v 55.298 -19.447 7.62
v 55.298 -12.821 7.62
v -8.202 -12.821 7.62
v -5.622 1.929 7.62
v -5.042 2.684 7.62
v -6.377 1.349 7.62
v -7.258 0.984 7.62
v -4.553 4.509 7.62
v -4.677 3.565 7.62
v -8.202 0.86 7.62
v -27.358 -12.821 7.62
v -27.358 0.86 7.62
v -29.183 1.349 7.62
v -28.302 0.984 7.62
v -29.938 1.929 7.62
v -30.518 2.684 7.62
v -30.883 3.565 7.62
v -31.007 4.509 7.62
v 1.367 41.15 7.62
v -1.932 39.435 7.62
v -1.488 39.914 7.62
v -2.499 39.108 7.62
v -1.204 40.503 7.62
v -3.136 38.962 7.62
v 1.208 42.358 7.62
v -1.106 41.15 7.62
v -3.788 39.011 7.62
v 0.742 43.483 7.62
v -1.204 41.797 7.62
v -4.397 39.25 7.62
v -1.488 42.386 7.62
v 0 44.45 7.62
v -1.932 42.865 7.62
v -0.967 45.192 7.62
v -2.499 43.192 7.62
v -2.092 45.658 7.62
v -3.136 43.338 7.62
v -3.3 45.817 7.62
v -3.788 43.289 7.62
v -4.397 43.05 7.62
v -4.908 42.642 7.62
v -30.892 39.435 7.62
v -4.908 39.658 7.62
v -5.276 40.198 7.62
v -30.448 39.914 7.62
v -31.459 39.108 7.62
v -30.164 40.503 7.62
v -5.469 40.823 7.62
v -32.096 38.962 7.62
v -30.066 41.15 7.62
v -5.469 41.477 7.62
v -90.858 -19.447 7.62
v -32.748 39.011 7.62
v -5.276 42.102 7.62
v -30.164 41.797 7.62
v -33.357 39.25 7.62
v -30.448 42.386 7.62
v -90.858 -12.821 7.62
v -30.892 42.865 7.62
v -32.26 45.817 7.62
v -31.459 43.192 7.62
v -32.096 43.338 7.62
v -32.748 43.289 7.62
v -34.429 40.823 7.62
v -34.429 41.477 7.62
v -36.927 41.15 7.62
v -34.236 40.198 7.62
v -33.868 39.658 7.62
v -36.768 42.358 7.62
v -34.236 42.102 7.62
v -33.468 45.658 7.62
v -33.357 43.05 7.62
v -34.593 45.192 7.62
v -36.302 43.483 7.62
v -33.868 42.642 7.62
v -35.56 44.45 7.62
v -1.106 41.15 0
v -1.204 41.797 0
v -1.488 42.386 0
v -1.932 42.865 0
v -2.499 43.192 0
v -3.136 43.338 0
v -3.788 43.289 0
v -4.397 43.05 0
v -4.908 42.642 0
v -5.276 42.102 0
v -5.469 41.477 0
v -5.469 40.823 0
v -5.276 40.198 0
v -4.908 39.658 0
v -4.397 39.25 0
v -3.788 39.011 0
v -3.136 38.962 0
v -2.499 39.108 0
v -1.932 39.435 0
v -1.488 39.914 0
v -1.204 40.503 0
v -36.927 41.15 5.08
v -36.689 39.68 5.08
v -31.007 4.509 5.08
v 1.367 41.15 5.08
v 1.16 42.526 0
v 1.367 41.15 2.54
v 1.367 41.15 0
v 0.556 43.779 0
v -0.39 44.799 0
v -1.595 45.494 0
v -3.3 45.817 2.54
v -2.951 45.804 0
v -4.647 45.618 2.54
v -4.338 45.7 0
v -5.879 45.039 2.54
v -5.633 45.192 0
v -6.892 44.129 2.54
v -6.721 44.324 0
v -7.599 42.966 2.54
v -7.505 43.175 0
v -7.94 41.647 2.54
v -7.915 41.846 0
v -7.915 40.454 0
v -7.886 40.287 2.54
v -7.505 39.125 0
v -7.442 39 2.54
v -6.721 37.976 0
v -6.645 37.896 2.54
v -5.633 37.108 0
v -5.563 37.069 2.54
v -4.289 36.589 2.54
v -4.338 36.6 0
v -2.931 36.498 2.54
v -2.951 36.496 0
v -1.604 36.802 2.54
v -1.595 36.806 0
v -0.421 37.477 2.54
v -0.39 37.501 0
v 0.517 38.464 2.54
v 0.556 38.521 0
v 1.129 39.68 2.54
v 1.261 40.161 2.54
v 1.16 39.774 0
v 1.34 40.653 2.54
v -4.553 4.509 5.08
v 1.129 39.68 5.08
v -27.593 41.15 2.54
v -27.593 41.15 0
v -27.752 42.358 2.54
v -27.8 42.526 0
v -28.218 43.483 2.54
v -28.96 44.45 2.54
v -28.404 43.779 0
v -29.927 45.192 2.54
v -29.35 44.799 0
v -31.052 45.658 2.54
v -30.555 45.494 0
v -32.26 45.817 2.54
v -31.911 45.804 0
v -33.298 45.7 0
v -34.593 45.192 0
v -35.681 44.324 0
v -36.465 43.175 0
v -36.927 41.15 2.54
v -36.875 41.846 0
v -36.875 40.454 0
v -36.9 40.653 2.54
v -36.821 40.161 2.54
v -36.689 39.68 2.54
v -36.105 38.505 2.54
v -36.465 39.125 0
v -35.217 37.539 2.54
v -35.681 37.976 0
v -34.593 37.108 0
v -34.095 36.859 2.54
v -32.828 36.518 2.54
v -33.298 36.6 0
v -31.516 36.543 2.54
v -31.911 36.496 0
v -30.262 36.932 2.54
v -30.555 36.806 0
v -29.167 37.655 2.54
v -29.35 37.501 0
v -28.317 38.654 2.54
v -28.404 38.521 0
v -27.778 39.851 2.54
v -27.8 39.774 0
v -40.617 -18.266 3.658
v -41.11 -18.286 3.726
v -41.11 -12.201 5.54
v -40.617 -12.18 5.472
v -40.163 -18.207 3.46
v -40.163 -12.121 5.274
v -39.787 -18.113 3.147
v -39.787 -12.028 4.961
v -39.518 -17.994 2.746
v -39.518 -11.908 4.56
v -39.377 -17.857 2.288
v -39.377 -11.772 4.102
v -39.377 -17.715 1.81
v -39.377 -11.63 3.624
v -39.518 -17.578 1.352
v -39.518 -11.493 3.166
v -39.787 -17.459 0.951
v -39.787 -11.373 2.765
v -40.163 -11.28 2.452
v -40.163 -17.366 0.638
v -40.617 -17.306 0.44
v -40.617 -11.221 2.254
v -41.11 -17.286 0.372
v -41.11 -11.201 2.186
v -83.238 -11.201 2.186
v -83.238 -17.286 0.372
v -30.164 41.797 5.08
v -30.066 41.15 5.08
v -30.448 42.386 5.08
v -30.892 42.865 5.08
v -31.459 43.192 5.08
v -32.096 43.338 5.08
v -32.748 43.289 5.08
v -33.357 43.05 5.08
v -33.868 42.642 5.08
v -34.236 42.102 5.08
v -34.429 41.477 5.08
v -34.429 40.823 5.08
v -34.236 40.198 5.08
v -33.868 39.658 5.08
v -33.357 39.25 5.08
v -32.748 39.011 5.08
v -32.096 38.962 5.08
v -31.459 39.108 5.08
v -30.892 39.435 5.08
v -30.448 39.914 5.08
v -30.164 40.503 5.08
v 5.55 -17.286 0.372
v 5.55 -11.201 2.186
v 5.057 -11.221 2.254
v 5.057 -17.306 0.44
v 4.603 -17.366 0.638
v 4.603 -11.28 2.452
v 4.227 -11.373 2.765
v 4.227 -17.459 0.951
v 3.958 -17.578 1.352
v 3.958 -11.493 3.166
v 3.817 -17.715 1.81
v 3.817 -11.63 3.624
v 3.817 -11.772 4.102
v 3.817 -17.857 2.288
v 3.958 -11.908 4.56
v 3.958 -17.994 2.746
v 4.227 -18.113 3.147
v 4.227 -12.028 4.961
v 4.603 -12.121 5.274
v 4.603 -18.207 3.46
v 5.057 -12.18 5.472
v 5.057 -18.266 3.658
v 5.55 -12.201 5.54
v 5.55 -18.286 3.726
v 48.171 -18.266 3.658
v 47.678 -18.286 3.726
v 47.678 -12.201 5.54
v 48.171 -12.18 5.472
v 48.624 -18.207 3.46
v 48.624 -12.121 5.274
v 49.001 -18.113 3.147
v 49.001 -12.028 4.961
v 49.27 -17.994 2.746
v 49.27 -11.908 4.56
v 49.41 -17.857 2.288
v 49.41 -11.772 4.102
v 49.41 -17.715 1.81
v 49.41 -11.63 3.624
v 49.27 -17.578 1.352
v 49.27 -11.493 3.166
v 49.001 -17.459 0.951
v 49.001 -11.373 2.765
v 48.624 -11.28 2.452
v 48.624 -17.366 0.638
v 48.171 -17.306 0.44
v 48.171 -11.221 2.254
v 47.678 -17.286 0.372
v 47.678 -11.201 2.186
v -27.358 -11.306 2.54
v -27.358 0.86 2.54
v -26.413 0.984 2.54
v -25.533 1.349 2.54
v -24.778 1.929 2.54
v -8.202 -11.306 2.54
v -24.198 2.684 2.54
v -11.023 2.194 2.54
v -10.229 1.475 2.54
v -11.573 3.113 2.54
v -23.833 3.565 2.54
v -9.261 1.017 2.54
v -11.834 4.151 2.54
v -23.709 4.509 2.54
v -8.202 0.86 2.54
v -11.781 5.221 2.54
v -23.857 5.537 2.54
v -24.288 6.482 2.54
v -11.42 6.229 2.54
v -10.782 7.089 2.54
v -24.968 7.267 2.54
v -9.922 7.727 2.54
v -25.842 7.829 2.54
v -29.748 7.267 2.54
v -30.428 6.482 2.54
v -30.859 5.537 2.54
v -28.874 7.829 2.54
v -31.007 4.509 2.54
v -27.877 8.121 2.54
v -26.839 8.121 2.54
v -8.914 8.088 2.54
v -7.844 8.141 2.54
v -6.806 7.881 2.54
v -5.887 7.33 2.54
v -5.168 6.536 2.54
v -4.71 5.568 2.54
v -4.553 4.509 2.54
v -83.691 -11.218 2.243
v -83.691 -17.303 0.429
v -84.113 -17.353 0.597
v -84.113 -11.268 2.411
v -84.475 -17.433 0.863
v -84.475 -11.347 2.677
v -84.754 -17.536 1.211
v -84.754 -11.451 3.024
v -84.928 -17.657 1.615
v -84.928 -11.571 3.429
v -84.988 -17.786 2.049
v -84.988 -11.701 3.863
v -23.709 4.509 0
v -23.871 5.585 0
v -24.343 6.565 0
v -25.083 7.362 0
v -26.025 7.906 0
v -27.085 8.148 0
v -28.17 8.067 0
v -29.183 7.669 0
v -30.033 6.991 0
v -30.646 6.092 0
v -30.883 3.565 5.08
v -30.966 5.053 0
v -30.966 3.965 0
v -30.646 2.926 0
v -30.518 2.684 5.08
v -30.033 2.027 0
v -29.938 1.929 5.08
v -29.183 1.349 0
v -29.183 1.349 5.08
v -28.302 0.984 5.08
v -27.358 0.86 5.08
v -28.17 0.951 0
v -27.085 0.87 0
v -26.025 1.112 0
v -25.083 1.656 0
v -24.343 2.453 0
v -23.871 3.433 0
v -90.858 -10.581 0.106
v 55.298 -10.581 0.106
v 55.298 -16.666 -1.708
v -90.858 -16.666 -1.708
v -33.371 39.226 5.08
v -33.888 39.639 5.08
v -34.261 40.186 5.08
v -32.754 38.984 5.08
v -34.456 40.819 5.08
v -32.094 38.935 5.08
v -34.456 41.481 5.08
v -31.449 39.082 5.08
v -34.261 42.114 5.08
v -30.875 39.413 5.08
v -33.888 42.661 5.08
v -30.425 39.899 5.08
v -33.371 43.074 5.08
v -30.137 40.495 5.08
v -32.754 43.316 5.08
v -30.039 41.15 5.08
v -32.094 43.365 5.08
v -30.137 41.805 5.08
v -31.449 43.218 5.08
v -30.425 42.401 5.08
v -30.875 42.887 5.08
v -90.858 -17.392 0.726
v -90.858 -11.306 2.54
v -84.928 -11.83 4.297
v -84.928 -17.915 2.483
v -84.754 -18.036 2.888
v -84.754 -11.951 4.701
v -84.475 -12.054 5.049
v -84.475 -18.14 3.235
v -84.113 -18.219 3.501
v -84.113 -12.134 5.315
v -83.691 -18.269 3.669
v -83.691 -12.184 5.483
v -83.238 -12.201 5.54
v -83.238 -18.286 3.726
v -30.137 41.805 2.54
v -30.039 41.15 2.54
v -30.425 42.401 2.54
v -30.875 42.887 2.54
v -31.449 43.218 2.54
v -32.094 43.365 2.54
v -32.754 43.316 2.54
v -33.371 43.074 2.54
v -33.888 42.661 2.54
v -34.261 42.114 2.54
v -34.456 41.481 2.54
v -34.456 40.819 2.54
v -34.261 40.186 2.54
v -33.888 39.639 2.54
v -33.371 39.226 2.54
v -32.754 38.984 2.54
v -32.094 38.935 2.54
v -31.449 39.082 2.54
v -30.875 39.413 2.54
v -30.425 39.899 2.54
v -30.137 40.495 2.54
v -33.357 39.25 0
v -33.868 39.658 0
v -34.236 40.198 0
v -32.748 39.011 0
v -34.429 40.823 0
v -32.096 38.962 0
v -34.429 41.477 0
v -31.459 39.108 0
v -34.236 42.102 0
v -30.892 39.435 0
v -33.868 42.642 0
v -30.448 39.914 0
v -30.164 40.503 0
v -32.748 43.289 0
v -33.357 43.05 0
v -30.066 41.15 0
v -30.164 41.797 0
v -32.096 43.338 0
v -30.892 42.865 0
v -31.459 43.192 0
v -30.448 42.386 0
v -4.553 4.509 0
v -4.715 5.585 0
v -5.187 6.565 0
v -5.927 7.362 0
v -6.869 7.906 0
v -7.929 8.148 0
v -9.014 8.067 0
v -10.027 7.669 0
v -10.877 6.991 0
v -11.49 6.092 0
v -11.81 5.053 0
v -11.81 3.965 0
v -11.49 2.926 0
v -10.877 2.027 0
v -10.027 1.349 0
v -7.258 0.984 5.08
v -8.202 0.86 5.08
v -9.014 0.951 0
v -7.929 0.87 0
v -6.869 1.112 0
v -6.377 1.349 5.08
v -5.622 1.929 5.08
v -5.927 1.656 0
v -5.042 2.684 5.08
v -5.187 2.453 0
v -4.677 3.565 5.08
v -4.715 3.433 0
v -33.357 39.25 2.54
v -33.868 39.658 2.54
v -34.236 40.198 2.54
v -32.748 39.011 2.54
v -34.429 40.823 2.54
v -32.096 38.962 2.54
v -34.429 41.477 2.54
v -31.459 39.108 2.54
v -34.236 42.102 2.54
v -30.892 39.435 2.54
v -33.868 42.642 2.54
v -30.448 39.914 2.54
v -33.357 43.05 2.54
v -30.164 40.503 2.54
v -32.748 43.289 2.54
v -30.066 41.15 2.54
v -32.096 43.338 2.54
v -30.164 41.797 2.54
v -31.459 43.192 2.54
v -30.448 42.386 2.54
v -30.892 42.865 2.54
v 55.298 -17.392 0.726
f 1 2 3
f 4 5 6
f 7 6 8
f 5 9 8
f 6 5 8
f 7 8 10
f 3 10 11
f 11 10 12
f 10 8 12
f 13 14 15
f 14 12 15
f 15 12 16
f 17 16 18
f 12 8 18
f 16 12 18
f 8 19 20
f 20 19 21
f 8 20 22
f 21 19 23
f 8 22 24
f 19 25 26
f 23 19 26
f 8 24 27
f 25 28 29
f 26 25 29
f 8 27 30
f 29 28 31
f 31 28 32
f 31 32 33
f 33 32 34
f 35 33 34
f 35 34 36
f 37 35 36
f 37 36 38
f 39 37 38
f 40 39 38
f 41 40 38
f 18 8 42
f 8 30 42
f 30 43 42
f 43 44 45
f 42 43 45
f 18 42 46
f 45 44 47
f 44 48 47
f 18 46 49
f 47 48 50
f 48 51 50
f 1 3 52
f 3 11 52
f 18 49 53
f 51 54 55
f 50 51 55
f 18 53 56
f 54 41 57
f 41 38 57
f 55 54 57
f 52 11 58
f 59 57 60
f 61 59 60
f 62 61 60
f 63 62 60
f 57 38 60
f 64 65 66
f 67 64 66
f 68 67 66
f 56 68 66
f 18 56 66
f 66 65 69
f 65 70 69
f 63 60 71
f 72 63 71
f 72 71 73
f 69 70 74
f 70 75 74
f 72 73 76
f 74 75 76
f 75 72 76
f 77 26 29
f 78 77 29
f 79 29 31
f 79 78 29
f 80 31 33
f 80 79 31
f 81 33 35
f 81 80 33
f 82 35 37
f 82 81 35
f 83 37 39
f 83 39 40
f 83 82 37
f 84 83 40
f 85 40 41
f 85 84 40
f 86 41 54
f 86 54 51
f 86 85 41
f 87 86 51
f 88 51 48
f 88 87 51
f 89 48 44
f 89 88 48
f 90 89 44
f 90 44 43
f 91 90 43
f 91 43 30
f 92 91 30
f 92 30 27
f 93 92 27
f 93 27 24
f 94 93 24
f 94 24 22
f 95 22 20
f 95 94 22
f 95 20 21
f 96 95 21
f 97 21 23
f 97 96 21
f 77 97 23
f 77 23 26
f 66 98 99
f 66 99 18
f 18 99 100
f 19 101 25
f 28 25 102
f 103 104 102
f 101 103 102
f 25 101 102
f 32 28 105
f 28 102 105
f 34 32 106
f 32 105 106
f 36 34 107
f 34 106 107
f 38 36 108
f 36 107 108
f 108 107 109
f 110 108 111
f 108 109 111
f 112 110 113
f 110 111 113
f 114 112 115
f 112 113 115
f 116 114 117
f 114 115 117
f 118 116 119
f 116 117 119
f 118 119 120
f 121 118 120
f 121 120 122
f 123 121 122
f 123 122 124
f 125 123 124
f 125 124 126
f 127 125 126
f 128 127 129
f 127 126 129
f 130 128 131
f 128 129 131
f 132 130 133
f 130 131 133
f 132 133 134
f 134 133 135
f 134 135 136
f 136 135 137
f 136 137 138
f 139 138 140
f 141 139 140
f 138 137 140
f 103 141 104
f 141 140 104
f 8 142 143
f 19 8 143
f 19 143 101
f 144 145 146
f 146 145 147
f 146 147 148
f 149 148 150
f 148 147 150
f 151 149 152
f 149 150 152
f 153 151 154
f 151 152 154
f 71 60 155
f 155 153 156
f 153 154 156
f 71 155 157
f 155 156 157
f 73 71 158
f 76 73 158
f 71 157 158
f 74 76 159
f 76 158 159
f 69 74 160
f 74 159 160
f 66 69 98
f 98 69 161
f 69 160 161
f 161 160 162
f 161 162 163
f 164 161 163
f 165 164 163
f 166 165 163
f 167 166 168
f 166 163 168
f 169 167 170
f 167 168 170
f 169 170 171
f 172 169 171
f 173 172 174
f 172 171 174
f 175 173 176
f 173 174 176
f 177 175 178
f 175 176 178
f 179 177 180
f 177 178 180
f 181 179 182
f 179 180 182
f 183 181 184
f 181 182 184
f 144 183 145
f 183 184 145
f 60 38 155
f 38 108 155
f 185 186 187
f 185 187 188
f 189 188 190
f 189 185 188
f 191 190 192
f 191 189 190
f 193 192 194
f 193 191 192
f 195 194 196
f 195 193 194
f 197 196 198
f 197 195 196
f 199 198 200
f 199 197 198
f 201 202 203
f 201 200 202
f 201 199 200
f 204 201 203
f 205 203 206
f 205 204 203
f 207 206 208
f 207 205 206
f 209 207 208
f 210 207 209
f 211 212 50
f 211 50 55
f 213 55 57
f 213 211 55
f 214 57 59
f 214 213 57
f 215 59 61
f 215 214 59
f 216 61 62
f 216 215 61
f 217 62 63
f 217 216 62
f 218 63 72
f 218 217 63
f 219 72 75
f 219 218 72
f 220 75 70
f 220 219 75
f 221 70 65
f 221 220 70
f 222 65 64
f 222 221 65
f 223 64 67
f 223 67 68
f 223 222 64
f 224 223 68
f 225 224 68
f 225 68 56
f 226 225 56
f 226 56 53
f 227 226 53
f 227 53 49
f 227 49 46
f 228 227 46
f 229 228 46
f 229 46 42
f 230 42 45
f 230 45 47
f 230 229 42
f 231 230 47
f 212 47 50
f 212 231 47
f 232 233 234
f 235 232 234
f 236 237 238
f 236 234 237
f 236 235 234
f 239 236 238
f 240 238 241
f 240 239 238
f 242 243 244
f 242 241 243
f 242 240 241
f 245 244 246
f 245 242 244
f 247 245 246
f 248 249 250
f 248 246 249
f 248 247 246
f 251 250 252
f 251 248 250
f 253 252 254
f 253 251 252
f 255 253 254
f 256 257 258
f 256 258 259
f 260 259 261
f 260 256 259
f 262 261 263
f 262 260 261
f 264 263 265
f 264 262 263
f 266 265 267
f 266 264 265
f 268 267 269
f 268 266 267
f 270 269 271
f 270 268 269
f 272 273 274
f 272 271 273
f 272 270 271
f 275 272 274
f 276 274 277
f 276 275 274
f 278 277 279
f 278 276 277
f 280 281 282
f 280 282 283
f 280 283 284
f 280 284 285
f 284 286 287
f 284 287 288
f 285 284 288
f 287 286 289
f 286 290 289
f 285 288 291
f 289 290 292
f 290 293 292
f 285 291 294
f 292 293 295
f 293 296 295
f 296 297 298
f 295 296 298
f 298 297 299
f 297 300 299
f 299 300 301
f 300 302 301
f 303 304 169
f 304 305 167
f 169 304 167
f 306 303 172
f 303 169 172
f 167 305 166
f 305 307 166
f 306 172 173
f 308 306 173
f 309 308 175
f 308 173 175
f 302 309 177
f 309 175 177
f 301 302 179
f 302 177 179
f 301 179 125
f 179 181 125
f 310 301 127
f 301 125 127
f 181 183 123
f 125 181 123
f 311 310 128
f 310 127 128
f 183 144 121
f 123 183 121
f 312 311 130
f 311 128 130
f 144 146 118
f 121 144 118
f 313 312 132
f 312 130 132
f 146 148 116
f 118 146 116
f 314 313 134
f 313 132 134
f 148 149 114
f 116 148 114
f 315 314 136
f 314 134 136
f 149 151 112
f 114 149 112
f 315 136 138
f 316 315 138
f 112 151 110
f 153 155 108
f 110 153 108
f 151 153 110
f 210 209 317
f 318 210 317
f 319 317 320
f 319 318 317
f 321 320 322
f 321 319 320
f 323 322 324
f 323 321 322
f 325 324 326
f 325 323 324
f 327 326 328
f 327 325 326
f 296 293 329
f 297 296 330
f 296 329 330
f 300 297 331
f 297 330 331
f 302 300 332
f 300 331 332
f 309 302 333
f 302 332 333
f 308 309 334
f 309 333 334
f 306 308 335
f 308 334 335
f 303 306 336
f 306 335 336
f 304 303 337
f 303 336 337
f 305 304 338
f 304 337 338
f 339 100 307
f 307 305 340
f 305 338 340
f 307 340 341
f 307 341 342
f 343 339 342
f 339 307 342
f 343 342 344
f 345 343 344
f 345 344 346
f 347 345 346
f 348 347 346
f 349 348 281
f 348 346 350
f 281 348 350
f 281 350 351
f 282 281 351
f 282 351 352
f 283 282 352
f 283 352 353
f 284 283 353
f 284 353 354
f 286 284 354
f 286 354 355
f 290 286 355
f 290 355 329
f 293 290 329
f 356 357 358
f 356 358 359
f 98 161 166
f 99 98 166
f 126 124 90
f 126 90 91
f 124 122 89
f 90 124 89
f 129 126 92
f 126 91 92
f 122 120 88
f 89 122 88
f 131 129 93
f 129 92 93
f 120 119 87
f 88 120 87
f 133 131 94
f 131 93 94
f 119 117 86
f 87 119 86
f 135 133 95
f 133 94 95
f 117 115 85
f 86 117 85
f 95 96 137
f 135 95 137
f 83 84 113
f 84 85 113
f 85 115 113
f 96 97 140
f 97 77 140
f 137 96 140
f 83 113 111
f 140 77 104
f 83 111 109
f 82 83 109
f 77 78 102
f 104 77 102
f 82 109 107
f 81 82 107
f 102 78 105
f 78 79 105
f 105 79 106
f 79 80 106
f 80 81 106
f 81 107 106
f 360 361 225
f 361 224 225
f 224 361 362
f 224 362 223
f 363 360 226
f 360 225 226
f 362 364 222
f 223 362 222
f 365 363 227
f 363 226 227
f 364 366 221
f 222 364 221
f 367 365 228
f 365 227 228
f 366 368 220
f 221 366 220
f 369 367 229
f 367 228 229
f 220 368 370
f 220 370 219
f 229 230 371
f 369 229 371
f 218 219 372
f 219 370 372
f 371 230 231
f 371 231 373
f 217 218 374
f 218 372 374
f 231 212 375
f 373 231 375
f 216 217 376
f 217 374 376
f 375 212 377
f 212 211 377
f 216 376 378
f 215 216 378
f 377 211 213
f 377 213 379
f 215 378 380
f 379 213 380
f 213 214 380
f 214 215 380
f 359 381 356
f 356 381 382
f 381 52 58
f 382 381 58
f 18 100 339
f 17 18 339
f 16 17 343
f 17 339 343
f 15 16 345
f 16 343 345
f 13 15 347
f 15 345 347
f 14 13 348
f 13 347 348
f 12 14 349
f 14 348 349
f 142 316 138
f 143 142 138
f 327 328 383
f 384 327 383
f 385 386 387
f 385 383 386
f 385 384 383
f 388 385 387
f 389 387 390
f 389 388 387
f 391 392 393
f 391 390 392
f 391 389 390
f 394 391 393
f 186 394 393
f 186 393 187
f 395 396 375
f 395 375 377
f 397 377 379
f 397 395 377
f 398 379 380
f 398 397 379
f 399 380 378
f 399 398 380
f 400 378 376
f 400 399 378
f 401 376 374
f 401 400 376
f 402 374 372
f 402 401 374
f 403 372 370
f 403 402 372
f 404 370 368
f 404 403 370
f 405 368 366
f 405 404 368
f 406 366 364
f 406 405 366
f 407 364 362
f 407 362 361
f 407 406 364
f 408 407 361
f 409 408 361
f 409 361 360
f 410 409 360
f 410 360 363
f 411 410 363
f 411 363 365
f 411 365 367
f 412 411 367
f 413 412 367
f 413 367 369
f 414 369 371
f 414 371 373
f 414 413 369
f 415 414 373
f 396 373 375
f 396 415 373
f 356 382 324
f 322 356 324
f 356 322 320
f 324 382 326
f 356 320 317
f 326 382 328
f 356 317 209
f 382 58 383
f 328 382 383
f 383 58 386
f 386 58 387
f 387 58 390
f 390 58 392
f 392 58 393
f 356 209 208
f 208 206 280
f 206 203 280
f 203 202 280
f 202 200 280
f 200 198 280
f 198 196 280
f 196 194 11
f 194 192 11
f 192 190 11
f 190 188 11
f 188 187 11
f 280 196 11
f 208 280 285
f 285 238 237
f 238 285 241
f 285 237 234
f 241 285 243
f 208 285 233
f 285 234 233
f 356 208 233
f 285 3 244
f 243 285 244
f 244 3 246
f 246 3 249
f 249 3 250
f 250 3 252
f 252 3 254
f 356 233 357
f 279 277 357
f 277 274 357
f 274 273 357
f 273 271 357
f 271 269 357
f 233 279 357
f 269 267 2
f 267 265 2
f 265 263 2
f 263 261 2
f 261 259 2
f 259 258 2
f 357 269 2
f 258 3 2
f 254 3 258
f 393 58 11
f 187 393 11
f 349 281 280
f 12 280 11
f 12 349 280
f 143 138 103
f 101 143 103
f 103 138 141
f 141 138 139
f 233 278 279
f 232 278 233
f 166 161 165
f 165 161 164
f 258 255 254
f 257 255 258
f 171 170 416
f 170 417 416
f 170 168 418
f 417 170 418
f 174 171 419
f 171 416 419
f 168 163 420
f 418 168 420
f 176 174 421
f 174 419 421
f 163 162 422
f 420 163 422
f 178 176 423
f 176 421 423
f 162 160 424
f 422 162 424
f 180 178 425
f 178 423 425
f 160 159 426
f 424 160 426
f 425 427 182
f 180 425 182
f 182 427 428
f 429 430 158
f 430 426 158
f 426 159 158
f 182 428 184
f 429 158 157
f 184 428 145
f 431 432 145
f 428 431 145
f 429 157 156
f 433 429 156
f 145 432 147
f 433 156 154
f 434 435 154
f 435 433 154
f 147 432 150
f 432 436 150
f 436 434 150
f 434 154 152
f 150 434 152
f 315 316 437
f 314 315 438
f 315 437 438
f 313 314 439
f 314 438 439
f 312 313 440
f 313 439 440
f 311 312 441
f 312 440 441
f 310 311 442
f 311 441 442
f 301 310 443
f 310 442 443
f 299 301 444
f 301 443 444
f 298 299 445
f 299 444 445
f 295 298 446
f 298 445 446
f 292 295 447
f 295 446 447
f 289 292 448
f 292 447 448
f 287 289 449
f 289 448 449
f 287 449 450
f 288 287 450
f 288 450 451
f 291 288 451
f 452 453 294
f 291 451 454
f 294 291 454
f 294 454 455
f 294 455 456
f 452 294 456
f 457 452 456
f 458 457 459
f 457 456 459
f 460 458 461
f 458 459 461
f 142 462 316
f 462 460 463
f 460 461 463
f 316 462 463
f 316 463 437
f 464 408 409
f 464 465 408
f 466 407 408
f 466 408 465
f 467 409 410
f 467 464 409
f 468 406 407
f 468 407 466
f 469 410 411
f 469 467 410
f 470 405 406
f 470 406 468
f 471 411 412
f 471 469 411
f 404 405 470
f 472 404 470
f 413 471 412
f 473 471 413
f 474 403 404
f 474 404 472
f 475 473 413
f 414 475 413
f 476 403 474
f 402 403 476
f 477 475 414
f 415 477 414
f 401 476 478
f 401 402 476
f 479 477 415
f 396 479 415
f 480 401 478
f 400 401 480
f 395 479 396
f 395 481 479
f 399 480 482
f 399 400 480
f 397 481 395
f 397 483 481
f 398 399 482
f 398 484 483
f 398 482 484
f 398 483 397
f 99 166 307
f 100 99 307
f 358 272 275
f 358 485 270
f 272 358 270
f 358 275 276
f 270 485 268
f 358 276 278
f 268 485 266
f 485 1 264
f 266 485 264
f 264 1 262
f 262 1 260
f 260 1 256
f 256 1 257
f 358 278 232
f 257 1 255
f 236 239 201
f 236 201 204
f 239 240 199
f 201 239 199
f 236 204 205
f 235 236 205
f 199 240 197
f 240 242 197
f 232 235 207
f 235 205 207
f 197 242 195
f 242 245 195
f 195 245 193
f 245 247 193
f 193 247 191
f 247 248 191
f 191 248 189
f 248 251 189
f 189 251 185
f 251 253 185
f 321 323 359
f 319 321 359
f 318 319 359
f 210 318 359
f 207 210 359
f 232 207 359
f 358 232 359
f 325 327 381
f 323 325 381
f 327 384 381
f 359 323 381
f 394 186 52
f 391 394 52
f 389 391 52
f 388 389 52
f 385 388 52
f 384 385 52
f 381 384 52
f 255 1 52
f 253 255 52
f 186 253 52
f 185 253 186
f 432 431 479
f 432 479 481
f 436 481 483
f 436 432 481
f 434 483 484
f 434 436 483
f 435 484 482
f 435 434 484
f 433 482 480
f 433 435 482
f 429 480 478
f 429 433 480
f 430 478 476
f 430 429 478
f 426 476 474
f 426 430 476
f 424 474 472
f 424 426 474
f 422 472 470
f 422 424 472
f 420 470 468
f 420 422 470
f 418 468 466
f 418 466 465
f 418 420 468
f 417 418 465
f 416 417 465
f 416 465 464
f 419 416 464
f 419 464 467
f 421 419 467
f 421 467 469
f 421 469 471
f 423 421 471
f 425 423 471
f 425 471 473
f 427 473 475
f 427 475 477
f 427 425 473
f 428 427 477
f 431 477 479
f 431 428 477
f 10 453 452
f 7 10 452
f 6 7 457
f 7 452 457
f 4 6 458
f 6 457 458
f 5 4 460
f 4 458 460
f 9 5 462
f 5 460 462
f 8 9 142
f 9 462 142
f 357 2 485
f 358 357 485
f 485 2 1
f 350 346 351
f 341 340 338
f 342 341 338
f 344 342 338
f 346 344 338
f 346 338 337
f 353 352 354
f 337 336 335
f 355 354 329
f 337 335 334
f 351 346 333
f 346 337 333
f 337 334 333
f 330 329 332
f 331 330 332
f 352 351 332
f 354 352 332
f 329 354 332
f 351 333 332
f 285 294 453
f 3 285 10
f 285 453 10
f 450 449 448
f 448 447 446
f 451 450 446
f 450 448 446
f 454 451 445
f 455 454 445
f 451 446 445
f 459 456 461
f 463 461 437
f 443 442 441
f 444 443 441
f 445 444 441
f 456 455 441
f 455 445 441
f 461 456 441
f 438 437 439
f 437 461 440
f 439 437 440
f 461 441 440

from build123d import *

# Parameters (mm, degrees)
SKETCH1_R               = 3.649213309
BOSS_EXTRUDE1_DEPTH     = 2.54
SKETCH1_R_2             = 4.666904756
SKETCH1_R_3             = 2.193652513
BOSS_EXTRUDE1_2_DEPTH   = 2.54
BOSS_EXTRUDE1_3_DEPTH   = 2.54
BOSS_EXTRUDE1_4_DEPTH   = 2.54
SKETCH2_R               = 2.193652513
SKETCH2_R_2             = 2.221197288
SKETCH2_R_3             = 3.649213309
BOSS_EXTRUDE2_DEPTH     = 2.54
SKETCH4_R               = 2.193652513
BOSS_EXTRUDE3_DEPTH     = 2.54
BOSS_EXTRUDE4_REACH     = 60.675
SKETCH5_W               = 19.155946822
SKETCH5_H               = 5.08
SKETCH6_W               = 19.155946822
SKETCH6_H               = 5.30085264
BOSS_EXTRUDE5_DEPTH     = 6.35
SKETCH7_W               = 19.155946822
SKETCH7_H               = 3.58914736
SKETCH7_H_2             = 5.30085264
BOSS_EXTRUDE6_DEPTH     = 6.349999999
CUT_EXTRUDE1_DEPTH      = 113.695579137
BOSS_EXTRUDE7_DEPTH     = 2.54
CUT_EXTRUDE2_DEPTH      = 107.988040918
CUT_EXTRUDE2_DEPTH_BACK = 107.988040918


with BuildPart() as part:
    # Sketch1 → Boss-Extrude1 (new body)
    with BuildSketch(Plane.XY):
        with Locations((-8.202026589, 4.509084108)):
            Circle(SKETCH1_R)
    extrude(amount=BOSS_EXTRUDE1_DEPTH)



with BuildPart() as body_2:
    # Sketch1 → Boss-Extrude1 2 (new body)
    with BuildSketch(Plane.XY):
        with Locations((-3.3, 41.15)):
            Circle(SKETCH1_R_2)
        with Locations((-3.3, 41.15)):
            Circle(SKETCH1_R_3, mode=Mode.SUBTRACT)
    extrude(amount=BOSS_EXTRUDE1_2_DEPTH)


with BuildPart() as body_3:
    # Sketch1 → Boss-Extrude1 3 (new body)
    with BuildSketch(Plane.XY):
        with Locations((-32.26, 41.15)):
            Circle(SKETCH1_R_2)
        with Locations((-32.26, 41.15)):
            Circle(SKETCH1_R_3, mode=Mode.SUBTRACT)
    extrude(amount=BOSS_EXTRUDE1_3_DEPTH)


with BuildPart() as body_4:
    # Sketch1 → Boss-Extrude1 4 (new body)
    with BuildSketch(Plane.XY):
        with Locations((-27.357973411, 4.509084108)):
            Circle(SKETCH1_R)
    extrude(amount=BOSS_EXTRUDE1_4_DEPTH)


with BuildPart() as part_1:
    add(part.part)

    add(body_2.part)  # Boss-Extrude2 merges body 2

    add(body_3.part)  # Boss-Extrude2 merges body 3

    add(body_4.part)  # Boss-Extrude2 merges body 4
    # Sketch2 → Boss-Extrude2 (add)
    # profile 1 of 5: a face of its own
    with BuildSketch(Plane.XY.offset(2.54)):
        with BuildLine():
            ThreePointArc((-8.202026589, 0.859870799), (-10.782410066, 7.089467585), (-4.552813279, 4.509084108))
            Line((-4.552813279, 4.509084108), (1.129473488, 39.680386235))
            ThreePointArc((1.129473488, 39.680386235), (-7.084081624, 38.418566994), (-3.3, 45.816904756))
            Line((-3.3, 45.816904756), (-32.26, 45.816904756))
            ThreePointArc((-32.26, 45.816904756), (-28.96, 44.45), (-27.593095244, 41.15))
            ThreePointArc((-27.593095244, 41.15), (-31.515665024, 36.542835423), (-36.689473488, 39.680386235))
            Line((-36.689473488, 39.680386235), (-31.007186721, 4.509084108))
            ThreePointArc((-31.007186721, 4.509084108), (-27.357973411, 8.158297418), (-23.708760102, 4.509084108))
            ThreePointArc((-23.708760102, 4.509084108), (-24.777589934, 1.928700631), (-27.357973411, 0.859870799))
            Line((-27.357973411, 0.859870799), (-8.202026589, 0.859870799))
        make_face()
    # profile 2 of 5: a face of its own
    with BuildSketch(Plane.XY.offset(2.54)):
        with BuildLine():
            ThreePointArc((-3.3, 45.816904756), (-7.084081624, 38.418566994), (1.129473488, 39.680386235))
            Line((1.129473488, 39.680386235), (1.366904756, 41.15))
            ThreePointArc((1.366904756, 41.15), (0, 44.45), (-3.3, 45.816904756))
        make_face()
        with Locations((-3.3, 41.15)):
            Circle(SKETCH2_R, mode=Mode.SUBTRACT)
    # profile 3 of 5: a face of its own
    with BuildSketch(Plane.XY.offset(2.54)):
        with BuildLine():
            ThreePointArc((-27.593095244, 41.15), (-28.96, 44.45), (-32.26, 45.816904756))
            ThreePointArc((-32.26, 45.816904756), (-35.56, 44.45), (-36.926904756, 41.15))
            Line((-36.926904756, 41.15), (-36.689473488, 39.680386235))
            ThreePointArc((-36.689473488, 39.680386235), (-31.515665024, 36.542835423), (-27.593095244, 41.15))
        make_face()
        with Locations((-32.26, 41.15)):
            Circle(SKETCH2_R_2, mode=Mode.SUBTRACT)
    # profile 4 of 5: a face of its own
    with BuildSketch(Plane.XY.offset(2.54)):
        with Locations(Location((-27.357973411, 4.509084108, 0), (0, 0, 180))):
            Circle(SKETCH2_R_3)
    # profile 5 of 5: a face of its own
    with BuildSketch(Plane.XY.offset(2.54)):
        with Locations((-8.202026589, 4.509084108)):
            Circle(SKETCH2_R_3)
    extrude(amount=BOSS_EXTRUDE2_DEPTH)

    # Sketch4 → Boss-Extrude3 (add)
    with BuildSketch(Plane.XY.offset(5.08)):
        with BuildLine():
            Line((-4.552813279, 4.509084108), (1.366904756, 41.15))
            ThreePointArc((1.366904756, 41.15), (0, 44.45), (-3.3, 45.816904756))
            Line((-3.3, 45.816904756), (-32.26, 45.816904756))
            ThreePointArc((-32.26, 45.816904756), (-35.56, 44.45), (-36.926904756, 41.15))
            Line((-36.926904756, 41.15), (-31.007186721, 4.509084108))
            ThreePointArc((-31.007186721, 4.509084108), (-29.938356889, 1.928700631), (-27.357973411, 0.859870799))
            Line((-27.357973411, 0.859870799), (-8.202026589, 0.859870799))
            ThreePointArc((-8.202026589, 0.859870799), (-5.621643111, 1.928700631), (-4.552813279, 4.509084108))
        make_face()
        with Locations((-3.3, 41.15)):
            Circle(SKETCH4_R, mode=Mode.SUBTRACT)
        with Locations((-32.26, 41.15)):
            Circle(SKETCH4_R, mode=Mode.SUBTRACT)
    extrude(amount=BOSS_EXTRUDE3_DEPTH)

    # Boss-Extrude4: up to this plane
    boss_extrude4_end = Plane(origin=(-92.143596389, -1.511792321, -30.321031804), z_dir=(0, 0.9583363932007225, 0.2856420092826512))
    # Sketch5 → Boss-Extrude4 (add, up to the surface)
    with BuildSketch(Plane.XZ.offset(-0.859870799), mode=Mode.PRIVATE) as boss_extrude4_sk1:
        with Locations((-17.78, 5.08)):
            Rectangle(SKETCH5_W, SKETCH5_H)
    boss_extrude4_tool1 = split(extrude(boss_extrude4_sk1.sketch, amount=BOSS_EXTRUDE4_REACH, mode=Mode.PRIVATE), bisect_by=boss_extrude4_end, keep=Keep.BOTH, mode=Mode.PRIVATE)
    add(boss_extrude4_tool1.solids().sort_by_distance((-17.78, 0.859871, 5.08))[0])

    # Sketch6 → Boss-Extrude5 (add)
    with BuildSketch(Plane(origin=(0, -9.68855673, -2.887773887), x_dir=(1, 0, 0), z_dir=(0, -0.9583363932007226, -0.2856420092826512))):
        with Locations((-17.78, 8.314172293)):
            Rectangle(SKETCH6_W, SKETCH6_H)
    extrude(amount=BOSS_EXTRUDE5_DEPTH)

    # Sketch7 → Boss-Extrude6 (add)
    with BuildSketch(Plane(origin=(0, -15.773992827, -4.701600646), x_dir=(1, 0, 0), z_dir=(0, -0.9583363932007226, -0.2856420092826512))):
        Polygon((-90.857973411, 5.663745973), (-27.357973411, 5.663745973), (-27.357973411, 10.964598613), (-27.357973411, 14.553745973), (-90.857973411, 14.553745973), align=None)
        with Locations((-17.78, 12.759172293)):
            Rectangle(SKETCH7_W, SKETCH7_H)
        with Locations((-17.78, 8.314172293)):
            Rectangle(SKETCH7_W, SKETCH7_H_2)
        Polygon((-8.202026589, 10.964598613), (-8.202026589, 5.663745973), (55.297973411, 5.663745973), (55.297973411, 14.553745973), (-8.202026589, 14.553745973), align=None)
    extrude(amount=-BOSS_EXTRUDE6_DEPTH)

    # Sketch9 → Cut-Extrude1 (cut, through all)
    with BuildSketch(Plane(origin=(0, 45.816904756, 0), x_dir=(1, 0, 0), z_dir=(0, 1, 0))):
        Polygon((-3.3, -7.62), (-17.78, -7.62), (-17.78, -45.955901378), (77.021856541, -45.955901378), (77.021856541, -7.62), align=None)
        Polygon((-17.78, -45.955901378), (-17.78, -7.62), (-32.26, -7.62), (-120.520571542, -7.62), (-120.520571542, -45.955901378), align=None)
    extrude(amount=-CUT_EXTRUDE1_DEPTH, mode=Mode.SUBTRACT)

    # Sketch10 → Boss-Extrude7 (add)
    with BuildSketch(Plane(origin=(0, -1.61780378, 5.427773887), x_dir=(-1, 0, 0), z_dir=(0, 0.28564200928265115, -0.9583363932007226))):
        Polygon((27.357973411, -10.109766049), (8.202026589, -10.109766049), (-55.297973411, -10.109766049), (-55.297973411, -16.459766048), (90.857973411, -16.459766048), (90.857973411, -10.109766049), align=None)
    extrude(amount=BOSS_EXTRUDE7_DEPTH)

    # Sketch11 → Cut-Extrude2 (cut, two sides: drawn at the far end of the back side and taken through both)
    with BuildSketch(Plane(origin=(0, -9.688556731, -2.887773887), x_dir=(1, 0, 0), z_dir=(0, 0.9583363932007284, 0.28564200928263184)).offset(-CUT_EXTRUDE2_DEPTH_BACK)):
        with BuildLine():
            Line((-41.109605197, -5.294172293), (-83.237973411, -5.294172293))
            ThreePointArc((-83.237973411, -5.294172293), (-84.475410278, -5.806735425), (-84.987973411, -7.044172293))
            ThreePointArc((-84.987973411, -7.044172293), (-84.475410278, -8.28160916), (-83.237973411, -8.794172293))
            Line((-83.237973411, -8.794172293), (-41.109605197, -8.794172293))
            ThreePointArc((-41.109605197, -8.794172293), (-39.359605197, -7.044172293), (-41.109605197, -5.294172293))
        make_face()
        with BuildLine():
            Line((5.549605197, -8.794172293), (47.677973411, -8.794172293))
            ThreePointArc((47.677973411, -8.794172293), (49.427973411, -7.044172293), (47.677973411, -5.294172293))
            Line((47.677973411, -5.294172293), (5.549605197, -5.294172293))
            ThreePointArc((5.549605197, -5.294172293), (3.799605197, -7.044172293), (5.549605197, -8.794172293))
        make_face()
    extrude(amount=CUT_EXTRUDE2_DEPTH + CUT_EXTRUDE2_DEPTH_BACK, mode=Mode.SUBTRACT)


solid = part_1.part
